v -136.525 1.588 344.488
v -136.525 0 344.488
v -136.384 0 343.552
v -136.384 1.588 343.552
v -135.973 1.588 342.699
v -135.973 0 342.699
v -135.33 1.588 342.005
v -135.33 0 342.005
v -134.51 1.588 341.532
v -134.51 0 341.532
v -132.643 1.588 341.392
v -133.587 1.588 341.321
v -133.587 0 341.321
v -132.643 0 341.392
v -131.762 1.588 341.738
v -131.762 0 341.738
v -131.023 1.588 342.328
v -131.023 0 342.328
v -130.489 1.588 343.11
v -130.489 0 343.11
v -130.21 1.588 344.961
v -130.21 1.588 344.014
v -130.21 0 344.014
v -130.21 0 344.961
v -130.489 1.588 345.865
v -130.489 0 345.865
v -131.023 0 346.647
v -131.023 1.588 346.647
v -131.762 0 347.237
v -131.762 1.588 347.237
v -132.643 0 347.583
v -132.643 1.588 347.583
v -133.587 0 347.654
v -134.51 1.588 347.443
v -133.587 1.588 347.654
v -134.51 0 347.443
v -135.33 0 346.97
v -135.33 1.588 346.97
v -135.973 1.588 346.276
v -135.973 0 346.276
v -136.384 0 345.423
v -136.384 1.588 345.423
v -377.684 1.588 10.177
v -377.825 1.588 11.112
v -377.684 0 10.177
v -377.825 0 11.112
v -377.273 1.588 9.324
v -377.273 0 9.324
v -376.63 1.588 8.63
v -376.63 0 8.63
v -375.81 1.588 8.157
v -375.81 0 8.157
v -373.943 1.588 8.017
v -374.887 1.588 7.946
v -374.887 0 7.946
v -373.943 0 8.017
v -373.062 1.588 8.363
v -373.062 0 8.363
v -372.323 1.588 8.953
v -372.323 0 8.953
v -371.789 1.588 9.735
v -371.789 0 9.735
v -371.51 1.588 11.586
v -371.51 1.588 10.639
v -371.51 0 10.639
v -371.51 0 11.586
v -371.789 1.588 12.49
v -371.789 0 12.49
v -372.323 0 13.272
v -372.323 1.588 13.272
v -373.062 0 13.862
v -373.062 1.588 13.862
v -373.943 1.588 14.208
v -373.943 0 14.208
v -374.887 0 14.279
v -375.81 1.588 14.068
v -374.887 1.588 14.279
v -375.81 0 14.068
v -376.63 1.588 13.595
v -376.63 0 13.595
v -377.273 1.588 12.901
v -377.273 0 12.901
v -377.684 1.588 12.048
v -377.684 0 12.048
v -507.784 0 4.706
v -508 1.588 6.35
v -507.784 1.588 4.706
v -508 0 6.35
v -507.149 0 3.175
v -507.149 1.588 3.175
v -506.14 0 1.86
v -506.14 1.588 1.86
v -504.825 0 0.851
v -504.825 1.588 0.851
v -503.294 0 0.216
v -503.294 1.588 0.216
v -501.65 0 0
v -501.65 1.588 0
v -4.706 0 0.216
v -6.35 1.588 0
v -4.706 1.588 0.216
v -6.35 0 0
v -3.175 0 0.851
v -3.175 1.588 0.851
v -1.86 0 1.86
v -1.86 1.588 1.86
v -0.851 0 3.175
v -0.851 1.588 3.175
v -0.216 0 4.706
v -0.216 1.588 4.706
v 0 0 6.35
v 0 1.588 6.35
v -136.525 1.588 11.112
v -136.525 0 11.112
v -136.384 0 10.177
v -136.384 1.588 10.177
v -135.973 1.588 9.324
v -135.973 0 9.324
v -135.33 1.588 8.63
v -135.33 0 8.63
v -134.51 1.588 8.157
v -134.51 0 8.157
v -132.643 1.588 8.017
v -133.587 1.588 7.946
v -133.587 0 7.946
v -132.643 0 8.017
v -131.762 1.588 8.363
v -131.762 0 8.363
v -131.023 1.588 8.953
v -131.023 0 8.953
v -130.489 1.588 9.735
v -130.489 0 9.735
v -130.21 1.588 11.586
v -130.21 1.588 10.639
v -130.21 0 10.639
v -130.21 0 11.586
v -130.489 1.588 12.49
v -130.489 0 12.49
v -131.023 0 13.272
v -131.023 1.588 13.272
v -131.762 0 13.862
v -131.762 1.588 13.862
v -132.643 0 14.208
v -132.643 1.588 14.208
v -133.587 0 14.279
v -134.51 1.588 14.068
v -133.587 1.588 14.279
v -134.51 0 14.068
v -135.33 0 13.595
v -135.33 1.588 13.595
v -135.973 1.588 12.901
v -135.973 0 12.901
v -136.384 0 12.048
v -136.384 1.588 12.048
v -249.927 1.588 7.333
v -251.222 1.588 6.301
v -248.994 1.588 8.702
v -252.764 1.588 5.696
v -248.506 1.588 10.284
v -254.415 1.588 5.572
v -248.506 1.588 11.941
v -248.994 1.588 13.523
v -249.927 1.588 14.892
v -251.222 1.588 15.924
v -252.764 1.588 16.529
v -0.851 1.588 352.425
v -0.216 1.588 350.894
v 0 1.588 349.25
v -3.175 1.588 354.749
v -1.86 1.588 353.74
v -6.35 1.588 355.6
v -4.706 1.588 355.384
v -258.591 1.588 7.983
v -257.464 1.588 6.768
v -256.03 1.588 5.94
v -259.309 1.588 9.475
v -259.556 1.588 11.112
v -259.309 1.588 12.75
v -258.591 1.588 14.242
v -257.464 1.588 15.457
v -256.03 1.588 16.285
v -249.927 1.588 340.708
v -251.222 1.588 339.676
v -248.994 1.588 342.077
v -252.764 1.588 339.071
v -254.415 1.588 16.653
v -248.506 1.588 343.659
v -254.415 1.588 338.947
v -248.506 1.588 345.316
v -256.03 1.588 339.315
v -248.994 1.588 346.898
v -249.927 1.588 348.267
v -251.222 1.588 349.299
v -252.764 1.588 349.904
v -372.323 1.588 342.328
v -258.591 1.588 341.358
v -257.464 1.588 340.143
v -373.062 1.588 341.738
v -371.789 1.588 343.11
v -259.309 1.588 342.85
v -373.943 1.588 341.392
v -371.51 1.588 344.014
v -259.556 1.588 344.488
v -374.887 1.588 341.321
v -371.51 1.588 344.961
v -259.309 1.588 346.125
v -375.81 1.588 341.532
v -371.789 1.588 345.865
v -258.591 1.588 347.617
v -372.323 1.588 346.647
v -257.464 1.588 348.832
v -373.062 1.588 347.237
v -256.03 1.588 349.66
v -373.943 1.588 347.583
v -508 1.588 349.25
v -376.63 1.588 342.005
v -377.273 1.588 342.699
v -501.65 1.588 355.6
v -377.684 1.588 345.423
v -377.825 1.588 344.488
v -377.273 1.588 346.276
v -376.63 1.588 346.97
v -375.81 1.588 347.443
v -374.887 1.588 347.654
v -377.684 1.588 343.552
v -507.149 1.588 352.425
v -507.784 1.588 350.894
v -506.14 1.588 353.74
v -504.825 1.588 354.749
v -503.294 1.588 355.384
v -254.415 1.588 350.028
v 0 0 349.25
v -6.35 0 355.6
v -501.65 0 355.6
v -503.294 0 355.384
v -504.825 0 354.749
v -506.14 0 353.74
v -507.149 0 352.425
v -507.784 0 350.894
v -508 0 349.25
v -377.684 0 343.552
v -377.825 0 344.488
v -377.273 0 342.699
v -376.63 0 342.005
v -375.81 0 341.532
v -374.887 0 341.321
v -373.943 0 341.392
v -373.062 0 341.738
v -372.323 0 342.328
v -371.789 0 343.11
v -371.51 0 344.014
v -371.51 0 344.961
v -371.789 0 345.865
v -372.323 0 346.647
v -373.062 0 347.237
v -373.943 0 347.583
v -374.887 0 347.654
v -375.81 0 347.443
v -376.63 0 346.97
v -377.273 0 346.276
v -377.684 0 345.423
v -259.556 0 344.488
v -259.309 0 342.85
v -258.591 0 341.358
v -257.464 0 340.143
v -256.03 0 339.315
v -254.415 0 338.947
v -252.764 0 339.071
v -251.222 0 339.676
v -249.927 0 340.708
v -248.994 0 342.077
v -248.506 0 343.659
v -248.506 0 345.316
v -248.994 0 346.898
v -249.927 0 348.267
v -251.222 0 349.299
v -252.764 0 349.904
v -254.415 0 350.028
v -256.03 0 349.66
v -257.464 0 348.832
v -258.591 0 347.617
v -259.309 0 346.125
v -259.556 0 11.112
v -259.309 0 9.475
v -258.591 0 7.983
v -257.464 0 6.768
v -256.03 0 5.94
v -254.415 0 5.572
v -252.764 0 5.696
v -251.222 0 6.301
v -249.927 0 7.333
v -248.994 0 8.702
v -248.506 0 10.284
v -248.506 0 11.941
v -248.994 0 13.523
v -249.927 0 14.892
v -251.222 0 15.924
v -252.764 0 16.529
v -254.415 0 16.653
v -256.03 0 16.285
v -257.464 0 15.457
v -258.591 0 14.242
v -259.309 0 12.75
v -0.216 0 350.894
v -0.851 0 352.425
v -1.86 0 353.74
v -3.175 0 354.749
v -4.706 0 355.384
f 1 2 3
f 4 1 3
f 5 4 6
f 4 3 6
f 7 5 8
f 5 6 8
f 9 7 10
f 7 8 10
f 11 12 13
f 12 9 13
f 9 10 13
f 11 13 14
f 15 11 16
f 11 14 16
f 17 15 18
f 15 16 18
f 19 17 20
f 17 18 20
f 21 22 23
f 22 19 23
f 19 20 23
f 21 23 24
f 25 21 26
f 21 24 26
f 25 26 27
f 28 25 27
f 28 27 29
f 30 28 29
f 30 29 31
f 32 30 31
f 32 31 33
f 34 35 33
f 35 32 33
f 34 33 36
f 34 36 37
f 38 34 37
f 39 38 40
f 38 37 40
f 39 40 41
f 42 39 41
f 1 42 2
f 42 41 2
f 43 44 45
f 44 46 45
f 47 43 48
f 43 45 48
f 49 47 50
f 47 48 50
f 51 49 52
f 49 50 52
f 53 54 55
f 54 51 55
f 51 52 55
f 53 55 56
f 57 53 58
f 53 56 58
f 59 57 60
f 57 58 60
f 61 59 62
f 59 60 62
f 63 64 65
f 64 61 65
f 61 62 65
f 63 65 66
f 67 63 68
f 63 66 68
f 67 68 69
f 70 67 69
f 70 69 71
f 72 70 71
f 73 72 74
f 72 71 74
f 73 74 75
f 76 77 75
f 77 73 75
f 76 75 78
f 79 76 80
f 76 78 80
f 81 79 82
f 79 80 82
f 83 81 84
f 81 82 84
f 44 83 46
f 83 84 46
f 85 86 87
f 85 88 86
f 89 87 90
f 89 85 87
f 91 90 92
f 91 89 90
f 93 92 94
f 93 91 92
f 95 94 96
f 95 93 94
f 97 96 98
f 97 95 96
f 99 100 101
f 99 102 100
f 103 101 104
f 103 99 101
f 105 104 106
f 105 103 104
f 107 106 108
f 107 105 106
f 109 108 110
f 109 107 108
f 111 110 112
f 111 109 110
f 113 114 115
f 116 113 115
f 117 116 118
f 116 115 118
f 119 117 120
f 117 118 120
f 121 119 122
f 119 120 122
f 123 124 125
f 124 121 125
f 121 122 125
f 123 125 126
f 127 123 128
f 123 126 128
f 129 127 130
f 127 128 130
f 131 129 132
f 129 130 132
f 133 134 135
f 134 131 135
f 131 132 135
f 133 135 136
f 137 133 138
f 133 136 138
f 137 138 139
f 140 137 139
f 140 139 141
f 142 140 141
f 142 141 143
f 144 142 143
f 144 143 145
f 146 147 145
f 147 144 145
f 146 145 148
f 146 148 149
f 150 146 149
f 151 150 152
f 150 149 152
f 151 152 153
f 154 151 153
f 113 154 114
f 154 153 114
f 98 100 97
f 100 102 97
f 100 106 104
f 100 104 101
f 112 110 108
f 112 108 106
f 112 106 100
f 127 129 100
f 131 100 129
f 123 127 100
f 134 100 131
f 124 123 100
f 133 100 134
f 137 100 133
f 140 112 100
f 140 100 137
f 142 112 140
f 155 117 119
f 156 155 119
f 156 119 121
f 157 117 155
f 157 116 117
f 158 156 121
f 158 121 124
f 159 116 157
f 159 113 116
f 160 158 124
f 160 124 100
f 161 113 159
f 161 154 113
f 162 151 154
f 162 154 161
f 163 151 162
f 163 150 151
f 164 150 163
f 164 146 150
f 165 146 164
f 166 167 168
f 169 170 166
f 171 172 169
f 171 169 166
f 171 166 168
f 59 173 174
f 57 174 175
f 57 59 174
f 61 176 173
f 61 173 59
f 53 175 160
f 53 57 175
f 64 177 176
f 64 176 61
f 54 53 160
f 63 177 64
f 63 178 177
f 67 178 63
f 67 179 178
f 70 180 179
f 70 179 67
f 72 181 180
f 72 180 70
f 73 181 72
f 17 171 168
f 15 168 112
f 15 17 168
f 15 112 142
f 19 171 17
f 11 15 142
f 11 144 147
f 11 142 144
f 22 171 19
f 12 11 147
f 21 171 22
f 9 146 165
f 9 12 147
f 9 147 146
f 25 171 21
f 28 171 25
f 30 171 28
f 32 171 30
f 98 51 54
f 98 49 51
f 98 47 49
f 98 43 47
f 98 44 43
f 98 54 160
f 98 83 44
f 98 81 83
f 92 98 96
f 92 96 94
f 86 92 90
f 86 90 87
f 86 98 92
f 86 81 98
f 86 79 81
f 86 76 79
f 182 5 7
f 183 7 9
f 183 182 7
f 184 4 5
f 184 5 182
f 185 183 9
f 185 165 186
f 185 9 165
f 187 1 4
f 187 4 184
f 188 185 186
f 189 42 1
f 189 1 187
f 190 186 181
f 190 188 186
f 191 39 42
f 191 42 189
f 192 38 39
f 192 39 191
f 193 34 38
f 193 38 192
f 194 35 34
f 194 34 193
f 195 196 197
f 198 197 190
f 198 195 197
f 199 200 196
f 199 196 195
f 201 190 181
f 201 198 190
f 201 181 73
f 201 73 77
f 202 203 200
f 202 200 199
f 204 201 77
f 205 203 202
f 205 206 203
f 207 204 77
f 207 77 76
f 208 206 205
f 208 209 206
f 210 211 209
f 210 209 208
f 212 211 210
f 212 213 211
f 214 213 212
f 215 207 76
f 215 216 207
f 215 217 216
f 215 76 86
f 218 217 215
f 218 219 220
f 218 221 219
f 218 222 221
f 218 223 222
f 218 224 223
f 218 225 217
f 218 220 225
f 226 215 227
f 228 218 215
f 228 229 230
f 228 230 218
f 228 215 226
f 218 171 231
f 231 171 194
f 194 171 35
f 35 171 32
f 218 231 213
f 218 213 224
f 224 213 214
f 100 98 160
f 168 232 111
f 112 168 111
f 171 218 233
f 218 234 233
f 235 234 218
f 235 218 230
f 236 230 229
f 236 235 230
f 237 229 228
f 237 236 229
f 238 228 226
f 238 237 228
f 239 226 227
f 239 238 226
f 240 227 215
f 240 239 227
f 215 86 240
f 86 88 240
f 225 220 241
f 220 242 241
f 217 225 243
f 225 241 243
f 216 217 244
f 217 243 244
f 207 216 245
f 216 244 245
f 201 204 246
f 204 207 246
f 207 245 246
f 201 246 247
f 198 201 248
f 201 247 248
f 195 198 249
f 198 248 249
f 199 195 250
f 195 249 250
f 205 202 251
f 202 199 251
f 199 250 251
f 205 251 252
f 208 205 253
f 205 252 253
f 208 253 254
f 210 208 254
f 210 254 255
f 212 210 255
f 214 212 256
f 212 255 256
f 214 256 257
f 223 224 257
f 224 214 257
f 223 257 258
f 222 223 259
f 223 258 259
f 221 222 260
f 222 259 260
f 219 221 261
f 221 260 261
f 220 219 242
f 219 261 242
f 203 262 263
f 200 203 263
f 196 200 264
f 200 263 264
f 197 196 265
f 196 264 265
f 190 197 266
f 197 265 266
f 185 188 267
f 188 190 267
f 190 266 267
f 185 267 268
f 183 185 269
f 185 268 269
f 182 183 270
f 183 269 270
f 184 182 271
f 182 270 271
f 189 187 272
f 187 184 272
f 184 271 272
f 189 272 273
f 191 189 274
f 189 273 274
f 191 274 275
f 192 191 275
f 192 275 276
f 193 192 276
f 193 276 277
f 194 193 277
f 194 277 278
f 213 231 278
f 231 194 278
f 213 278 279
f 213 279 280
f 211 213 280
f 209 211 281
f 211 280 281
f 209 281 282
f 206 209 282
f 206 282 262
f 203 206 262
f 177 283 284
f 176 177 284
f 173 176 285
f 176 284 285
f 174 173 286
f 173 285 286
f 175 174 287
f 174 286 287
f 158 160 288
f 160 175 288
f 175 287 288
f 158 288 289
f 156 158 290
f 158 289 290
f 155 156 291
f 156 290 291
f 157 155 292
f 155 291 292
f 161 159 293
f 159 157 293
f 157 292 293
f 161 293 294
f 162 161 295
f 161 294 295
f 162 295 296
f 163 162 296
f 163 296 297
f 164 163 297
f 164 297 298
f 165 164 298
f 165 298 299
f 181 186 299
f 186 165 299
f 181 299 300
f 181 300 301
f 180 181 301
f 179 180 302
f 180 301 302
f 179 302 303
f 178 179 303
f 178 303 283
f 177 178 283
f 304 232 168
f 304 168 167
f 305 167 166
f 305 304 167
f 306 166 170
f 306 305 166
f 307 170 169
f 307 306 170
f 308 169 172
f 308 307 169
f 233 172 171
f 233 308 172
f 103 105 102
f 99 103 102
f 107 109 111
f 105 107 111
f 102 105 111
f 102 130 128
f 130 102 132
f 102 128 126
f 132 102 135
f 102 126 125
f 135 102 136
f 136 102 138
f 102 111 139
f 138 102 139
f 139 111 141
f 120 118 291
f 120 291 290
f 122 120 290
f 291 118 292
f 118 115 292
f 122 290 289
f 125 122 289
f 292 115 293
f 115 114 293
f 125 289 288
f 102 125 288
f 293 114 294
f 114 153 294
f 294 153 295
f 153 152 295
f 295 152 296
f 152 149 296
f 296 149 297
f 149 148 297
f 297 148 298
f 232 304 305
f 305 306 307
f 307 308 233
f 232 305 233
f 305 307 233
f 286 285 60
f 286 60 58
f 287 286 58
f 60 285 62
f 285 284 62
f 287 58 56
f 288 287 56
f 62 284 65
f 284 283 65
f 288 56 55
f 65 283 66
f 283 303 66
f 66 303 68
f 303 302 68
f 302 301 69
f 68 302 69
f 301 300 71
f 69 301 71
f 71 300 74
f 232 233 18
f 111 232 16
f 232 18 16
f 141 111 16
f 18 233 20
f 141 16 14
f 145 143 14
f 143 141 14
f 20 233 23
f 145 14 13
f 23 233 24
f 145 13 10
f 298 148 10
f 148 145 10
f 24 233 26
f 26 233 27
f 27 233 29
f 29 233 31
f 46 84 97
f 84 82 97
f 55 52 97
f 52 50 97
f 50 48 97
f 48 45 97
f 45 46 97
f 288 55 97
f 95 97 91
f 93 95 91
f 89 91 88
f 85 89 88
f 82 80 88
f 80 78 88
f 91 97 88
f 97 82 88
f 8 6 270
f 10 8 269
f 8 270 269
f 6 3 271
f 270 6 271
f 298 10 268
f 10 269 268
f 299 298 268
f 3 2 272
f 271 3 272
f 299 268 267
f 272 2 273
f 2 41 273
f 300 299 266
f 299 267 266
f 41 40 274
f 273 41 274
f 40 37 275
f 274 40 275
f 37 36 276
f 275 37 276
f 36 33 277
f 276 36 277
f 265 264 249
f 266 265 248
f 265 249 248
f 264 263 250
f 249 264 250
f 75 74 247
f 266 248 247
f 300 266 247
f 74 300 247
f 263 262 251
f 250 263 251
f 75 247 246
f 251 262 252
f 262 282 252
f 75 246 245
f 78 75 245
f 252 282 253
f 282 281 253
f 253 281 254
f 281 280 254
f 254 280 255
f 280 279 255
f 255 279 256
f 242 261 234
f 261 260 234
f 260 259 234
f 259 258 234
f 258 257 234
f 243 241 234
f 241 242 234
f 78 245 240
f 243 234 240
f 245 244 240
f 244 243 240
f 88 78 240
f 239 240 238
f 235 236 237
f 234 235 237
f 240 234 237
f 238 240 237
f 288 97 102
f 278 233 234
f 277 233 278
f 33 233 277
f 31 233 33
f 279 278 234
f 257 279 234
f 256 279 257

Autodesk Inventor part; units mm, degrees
ref_plane "YZ Plane" through (0, 0, 0) normal (1, 0, 0) x (0, 1, 0)
ref_plane "XZ Plane" through (0, 0, 0) normal (0, 1, 0) x (-1, 0, 0)
ref_plane "XY Plane" through (0, 0, 0) normal (0, 0, 1) x (1, 0, 0)
sketch "Sketch1" plane through (0, 0, 0) normal (0, 1, 0) x (-1, 0, 0)
  line L0 (6.35, 0) -> (501.65, 0)
  line L1 (508, 6.35) -> (508, 349.25)
  line L2 (501.65, 355.6) -> (6.35, 355.6)
  line L3 (0, 349.25) -> (0, 6.35)
  line L4 (374.65, 344.4875) -> (133.35, 344.4875) construction
  line L5 (133.35, 344.4875) -> (133.35, 11.1125) construction
  line L6 (133.35, 11.1125) -> (374.65, 11.1125) construction
  line L7 (374.65, 11.1125) -> (374.65, 344.4875) construction
  line L8 (254, 344.4875) -> (254, 11.1125) construction
  line L9 (374.65, 344.4875) -> (508, 344.4875) construction
  line L10 (374.65, 344.4875) -> (374.65, 355.6) construction
  line L11 (133.35, 11.1125) -> (0, 11.1125) construction
  line L12 (133.35, 11.1125) -> (133.35, 0) construction
  circle A0 centre (374.65, 344.4875) radius 3.175
  circle A1 centre (374.65, 11.1125) radius 3.175
  circle A2 centre (133.35, 11.1125) radius 3.175
  circle A3 centre (133.35, 344.4875) radius 3.175
  circle A4 centre (254, 344.4875) radius 5.5562
  circle A5 centre (254, 11.1125) radius 5.5563
  arc A6 (508, 349.25) -> (501.65, 355.6) centre (501.65, 349.25) ccw
  arc A7 (501.65, 0) -> (508, 6.35) centre (501.65, 6.35) ccw
  arc A8 (0, 6.35) -> (6.35, 0) centre (6.35, 6.35) ccw
  arc A9 (6.35, 355.6) -> (0, 349.25) centre (6.35, 349.25) ccw
  point P0 (0, 0)
  point P1 (508, 355.6)
  point P2 (508, 0)
  point P3 (0, 355.6)
  dimension "d0" = 508
  dimension "d1" = 355.6
  dimension "d2" = 333.375
  dimension "d3" = 241.3
  dimension "d4" = 6.35
  dimension "d5" = 6.35
  dimension "d6" = 6.35
  dimension "d7" = 6.35
  dimension "d8" = 11.1125
  dimension "d9" = 11.1125
  dimension "d10" = 6.35
extrude "Extrusion1" add sketch "Sketch1" along normal blind 1.5875
equation "\"d5\" = d4"
equation "\"d6\" = d4"
equation "\"d7\" = d4"
equation "\"d9\" = d8"
properties part number "14x20 ATNT Sign"
